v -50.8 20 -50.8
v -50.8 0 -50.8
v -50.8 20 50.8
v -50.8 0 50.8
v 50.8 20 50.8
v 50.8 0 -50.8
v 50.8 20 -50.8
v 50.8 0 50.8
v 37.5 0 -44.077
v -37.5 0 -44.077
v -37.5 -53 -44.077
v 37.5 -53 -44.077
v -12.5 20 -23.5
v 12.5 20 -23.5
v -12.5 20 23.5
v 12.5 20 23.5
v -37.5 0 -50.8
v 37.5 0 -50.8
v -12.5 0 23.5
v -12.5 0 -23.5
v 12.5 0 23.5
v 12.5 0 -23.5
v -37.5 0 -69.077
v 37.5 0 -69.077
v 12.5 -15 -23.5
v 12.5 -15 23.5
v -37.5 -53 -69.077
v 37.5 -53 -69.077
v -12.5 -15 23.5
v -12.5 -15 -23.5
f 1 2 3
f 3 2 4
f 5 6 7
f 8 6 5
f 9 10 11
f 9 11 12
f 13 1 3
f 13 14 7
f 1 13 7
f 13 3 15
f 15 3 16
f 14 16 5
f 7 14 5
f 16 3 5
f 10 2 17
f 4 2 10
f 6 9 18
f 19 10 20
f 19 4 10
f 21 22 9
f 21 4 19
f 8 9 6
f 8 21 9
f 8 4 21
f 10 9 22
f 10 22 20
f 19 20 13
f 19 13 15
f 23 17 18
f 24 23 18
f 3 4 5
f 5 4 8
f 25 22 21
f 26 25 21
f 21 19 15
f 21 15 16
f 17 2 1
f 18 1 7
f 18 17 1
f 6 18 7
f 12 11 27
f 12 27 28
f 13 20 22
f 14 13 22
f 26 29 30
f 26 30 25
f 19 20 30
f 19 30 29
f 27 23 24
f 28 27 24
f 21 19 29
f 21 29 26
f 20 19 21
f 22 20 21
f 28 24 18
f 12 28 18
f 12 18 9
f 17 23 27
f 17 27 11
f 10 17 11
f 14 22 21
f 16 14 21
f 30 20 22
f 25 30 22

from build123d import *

# Parameters (mm, degrees)
F0_W     = 25
F0_H     = 47
F1_DEPTH = 15
F0_W_2   = 101.6
F0_H_2   = 101.6
F2_DEPTH = 20
F3_W     = 75
F3_H     = 25
F4_DEPTH = 53


with BuildPart() as f1:
    # F0 (on Front) → F1 (new body)
    with BuildSketch(Plane.XZ):
        Rectangle(F0_W, F0_H)
    extrude(amount=F1_DEPTH)


with BuildPart() as f2:
    # F0 (on Front) → F2 (new body)
    with BuildSketch(Plane.XZ):
        Rectangle(F0_W_2, F0_H_2)
        Rectangle(F0_W, F0_H, mode=Mode.SUBTRACT)
    extrude(amount=-F2_DEPTH)

    # F3 (on Front) → F4 (join)
    with BuildSketch(Plane.XZ):
        with Locations((0, -56.577301)):
            Rectangle(F3_W, F3_H)
    extrude(amount=F4_DEPTH)


solid = Compound([f1.part, f2.part])
